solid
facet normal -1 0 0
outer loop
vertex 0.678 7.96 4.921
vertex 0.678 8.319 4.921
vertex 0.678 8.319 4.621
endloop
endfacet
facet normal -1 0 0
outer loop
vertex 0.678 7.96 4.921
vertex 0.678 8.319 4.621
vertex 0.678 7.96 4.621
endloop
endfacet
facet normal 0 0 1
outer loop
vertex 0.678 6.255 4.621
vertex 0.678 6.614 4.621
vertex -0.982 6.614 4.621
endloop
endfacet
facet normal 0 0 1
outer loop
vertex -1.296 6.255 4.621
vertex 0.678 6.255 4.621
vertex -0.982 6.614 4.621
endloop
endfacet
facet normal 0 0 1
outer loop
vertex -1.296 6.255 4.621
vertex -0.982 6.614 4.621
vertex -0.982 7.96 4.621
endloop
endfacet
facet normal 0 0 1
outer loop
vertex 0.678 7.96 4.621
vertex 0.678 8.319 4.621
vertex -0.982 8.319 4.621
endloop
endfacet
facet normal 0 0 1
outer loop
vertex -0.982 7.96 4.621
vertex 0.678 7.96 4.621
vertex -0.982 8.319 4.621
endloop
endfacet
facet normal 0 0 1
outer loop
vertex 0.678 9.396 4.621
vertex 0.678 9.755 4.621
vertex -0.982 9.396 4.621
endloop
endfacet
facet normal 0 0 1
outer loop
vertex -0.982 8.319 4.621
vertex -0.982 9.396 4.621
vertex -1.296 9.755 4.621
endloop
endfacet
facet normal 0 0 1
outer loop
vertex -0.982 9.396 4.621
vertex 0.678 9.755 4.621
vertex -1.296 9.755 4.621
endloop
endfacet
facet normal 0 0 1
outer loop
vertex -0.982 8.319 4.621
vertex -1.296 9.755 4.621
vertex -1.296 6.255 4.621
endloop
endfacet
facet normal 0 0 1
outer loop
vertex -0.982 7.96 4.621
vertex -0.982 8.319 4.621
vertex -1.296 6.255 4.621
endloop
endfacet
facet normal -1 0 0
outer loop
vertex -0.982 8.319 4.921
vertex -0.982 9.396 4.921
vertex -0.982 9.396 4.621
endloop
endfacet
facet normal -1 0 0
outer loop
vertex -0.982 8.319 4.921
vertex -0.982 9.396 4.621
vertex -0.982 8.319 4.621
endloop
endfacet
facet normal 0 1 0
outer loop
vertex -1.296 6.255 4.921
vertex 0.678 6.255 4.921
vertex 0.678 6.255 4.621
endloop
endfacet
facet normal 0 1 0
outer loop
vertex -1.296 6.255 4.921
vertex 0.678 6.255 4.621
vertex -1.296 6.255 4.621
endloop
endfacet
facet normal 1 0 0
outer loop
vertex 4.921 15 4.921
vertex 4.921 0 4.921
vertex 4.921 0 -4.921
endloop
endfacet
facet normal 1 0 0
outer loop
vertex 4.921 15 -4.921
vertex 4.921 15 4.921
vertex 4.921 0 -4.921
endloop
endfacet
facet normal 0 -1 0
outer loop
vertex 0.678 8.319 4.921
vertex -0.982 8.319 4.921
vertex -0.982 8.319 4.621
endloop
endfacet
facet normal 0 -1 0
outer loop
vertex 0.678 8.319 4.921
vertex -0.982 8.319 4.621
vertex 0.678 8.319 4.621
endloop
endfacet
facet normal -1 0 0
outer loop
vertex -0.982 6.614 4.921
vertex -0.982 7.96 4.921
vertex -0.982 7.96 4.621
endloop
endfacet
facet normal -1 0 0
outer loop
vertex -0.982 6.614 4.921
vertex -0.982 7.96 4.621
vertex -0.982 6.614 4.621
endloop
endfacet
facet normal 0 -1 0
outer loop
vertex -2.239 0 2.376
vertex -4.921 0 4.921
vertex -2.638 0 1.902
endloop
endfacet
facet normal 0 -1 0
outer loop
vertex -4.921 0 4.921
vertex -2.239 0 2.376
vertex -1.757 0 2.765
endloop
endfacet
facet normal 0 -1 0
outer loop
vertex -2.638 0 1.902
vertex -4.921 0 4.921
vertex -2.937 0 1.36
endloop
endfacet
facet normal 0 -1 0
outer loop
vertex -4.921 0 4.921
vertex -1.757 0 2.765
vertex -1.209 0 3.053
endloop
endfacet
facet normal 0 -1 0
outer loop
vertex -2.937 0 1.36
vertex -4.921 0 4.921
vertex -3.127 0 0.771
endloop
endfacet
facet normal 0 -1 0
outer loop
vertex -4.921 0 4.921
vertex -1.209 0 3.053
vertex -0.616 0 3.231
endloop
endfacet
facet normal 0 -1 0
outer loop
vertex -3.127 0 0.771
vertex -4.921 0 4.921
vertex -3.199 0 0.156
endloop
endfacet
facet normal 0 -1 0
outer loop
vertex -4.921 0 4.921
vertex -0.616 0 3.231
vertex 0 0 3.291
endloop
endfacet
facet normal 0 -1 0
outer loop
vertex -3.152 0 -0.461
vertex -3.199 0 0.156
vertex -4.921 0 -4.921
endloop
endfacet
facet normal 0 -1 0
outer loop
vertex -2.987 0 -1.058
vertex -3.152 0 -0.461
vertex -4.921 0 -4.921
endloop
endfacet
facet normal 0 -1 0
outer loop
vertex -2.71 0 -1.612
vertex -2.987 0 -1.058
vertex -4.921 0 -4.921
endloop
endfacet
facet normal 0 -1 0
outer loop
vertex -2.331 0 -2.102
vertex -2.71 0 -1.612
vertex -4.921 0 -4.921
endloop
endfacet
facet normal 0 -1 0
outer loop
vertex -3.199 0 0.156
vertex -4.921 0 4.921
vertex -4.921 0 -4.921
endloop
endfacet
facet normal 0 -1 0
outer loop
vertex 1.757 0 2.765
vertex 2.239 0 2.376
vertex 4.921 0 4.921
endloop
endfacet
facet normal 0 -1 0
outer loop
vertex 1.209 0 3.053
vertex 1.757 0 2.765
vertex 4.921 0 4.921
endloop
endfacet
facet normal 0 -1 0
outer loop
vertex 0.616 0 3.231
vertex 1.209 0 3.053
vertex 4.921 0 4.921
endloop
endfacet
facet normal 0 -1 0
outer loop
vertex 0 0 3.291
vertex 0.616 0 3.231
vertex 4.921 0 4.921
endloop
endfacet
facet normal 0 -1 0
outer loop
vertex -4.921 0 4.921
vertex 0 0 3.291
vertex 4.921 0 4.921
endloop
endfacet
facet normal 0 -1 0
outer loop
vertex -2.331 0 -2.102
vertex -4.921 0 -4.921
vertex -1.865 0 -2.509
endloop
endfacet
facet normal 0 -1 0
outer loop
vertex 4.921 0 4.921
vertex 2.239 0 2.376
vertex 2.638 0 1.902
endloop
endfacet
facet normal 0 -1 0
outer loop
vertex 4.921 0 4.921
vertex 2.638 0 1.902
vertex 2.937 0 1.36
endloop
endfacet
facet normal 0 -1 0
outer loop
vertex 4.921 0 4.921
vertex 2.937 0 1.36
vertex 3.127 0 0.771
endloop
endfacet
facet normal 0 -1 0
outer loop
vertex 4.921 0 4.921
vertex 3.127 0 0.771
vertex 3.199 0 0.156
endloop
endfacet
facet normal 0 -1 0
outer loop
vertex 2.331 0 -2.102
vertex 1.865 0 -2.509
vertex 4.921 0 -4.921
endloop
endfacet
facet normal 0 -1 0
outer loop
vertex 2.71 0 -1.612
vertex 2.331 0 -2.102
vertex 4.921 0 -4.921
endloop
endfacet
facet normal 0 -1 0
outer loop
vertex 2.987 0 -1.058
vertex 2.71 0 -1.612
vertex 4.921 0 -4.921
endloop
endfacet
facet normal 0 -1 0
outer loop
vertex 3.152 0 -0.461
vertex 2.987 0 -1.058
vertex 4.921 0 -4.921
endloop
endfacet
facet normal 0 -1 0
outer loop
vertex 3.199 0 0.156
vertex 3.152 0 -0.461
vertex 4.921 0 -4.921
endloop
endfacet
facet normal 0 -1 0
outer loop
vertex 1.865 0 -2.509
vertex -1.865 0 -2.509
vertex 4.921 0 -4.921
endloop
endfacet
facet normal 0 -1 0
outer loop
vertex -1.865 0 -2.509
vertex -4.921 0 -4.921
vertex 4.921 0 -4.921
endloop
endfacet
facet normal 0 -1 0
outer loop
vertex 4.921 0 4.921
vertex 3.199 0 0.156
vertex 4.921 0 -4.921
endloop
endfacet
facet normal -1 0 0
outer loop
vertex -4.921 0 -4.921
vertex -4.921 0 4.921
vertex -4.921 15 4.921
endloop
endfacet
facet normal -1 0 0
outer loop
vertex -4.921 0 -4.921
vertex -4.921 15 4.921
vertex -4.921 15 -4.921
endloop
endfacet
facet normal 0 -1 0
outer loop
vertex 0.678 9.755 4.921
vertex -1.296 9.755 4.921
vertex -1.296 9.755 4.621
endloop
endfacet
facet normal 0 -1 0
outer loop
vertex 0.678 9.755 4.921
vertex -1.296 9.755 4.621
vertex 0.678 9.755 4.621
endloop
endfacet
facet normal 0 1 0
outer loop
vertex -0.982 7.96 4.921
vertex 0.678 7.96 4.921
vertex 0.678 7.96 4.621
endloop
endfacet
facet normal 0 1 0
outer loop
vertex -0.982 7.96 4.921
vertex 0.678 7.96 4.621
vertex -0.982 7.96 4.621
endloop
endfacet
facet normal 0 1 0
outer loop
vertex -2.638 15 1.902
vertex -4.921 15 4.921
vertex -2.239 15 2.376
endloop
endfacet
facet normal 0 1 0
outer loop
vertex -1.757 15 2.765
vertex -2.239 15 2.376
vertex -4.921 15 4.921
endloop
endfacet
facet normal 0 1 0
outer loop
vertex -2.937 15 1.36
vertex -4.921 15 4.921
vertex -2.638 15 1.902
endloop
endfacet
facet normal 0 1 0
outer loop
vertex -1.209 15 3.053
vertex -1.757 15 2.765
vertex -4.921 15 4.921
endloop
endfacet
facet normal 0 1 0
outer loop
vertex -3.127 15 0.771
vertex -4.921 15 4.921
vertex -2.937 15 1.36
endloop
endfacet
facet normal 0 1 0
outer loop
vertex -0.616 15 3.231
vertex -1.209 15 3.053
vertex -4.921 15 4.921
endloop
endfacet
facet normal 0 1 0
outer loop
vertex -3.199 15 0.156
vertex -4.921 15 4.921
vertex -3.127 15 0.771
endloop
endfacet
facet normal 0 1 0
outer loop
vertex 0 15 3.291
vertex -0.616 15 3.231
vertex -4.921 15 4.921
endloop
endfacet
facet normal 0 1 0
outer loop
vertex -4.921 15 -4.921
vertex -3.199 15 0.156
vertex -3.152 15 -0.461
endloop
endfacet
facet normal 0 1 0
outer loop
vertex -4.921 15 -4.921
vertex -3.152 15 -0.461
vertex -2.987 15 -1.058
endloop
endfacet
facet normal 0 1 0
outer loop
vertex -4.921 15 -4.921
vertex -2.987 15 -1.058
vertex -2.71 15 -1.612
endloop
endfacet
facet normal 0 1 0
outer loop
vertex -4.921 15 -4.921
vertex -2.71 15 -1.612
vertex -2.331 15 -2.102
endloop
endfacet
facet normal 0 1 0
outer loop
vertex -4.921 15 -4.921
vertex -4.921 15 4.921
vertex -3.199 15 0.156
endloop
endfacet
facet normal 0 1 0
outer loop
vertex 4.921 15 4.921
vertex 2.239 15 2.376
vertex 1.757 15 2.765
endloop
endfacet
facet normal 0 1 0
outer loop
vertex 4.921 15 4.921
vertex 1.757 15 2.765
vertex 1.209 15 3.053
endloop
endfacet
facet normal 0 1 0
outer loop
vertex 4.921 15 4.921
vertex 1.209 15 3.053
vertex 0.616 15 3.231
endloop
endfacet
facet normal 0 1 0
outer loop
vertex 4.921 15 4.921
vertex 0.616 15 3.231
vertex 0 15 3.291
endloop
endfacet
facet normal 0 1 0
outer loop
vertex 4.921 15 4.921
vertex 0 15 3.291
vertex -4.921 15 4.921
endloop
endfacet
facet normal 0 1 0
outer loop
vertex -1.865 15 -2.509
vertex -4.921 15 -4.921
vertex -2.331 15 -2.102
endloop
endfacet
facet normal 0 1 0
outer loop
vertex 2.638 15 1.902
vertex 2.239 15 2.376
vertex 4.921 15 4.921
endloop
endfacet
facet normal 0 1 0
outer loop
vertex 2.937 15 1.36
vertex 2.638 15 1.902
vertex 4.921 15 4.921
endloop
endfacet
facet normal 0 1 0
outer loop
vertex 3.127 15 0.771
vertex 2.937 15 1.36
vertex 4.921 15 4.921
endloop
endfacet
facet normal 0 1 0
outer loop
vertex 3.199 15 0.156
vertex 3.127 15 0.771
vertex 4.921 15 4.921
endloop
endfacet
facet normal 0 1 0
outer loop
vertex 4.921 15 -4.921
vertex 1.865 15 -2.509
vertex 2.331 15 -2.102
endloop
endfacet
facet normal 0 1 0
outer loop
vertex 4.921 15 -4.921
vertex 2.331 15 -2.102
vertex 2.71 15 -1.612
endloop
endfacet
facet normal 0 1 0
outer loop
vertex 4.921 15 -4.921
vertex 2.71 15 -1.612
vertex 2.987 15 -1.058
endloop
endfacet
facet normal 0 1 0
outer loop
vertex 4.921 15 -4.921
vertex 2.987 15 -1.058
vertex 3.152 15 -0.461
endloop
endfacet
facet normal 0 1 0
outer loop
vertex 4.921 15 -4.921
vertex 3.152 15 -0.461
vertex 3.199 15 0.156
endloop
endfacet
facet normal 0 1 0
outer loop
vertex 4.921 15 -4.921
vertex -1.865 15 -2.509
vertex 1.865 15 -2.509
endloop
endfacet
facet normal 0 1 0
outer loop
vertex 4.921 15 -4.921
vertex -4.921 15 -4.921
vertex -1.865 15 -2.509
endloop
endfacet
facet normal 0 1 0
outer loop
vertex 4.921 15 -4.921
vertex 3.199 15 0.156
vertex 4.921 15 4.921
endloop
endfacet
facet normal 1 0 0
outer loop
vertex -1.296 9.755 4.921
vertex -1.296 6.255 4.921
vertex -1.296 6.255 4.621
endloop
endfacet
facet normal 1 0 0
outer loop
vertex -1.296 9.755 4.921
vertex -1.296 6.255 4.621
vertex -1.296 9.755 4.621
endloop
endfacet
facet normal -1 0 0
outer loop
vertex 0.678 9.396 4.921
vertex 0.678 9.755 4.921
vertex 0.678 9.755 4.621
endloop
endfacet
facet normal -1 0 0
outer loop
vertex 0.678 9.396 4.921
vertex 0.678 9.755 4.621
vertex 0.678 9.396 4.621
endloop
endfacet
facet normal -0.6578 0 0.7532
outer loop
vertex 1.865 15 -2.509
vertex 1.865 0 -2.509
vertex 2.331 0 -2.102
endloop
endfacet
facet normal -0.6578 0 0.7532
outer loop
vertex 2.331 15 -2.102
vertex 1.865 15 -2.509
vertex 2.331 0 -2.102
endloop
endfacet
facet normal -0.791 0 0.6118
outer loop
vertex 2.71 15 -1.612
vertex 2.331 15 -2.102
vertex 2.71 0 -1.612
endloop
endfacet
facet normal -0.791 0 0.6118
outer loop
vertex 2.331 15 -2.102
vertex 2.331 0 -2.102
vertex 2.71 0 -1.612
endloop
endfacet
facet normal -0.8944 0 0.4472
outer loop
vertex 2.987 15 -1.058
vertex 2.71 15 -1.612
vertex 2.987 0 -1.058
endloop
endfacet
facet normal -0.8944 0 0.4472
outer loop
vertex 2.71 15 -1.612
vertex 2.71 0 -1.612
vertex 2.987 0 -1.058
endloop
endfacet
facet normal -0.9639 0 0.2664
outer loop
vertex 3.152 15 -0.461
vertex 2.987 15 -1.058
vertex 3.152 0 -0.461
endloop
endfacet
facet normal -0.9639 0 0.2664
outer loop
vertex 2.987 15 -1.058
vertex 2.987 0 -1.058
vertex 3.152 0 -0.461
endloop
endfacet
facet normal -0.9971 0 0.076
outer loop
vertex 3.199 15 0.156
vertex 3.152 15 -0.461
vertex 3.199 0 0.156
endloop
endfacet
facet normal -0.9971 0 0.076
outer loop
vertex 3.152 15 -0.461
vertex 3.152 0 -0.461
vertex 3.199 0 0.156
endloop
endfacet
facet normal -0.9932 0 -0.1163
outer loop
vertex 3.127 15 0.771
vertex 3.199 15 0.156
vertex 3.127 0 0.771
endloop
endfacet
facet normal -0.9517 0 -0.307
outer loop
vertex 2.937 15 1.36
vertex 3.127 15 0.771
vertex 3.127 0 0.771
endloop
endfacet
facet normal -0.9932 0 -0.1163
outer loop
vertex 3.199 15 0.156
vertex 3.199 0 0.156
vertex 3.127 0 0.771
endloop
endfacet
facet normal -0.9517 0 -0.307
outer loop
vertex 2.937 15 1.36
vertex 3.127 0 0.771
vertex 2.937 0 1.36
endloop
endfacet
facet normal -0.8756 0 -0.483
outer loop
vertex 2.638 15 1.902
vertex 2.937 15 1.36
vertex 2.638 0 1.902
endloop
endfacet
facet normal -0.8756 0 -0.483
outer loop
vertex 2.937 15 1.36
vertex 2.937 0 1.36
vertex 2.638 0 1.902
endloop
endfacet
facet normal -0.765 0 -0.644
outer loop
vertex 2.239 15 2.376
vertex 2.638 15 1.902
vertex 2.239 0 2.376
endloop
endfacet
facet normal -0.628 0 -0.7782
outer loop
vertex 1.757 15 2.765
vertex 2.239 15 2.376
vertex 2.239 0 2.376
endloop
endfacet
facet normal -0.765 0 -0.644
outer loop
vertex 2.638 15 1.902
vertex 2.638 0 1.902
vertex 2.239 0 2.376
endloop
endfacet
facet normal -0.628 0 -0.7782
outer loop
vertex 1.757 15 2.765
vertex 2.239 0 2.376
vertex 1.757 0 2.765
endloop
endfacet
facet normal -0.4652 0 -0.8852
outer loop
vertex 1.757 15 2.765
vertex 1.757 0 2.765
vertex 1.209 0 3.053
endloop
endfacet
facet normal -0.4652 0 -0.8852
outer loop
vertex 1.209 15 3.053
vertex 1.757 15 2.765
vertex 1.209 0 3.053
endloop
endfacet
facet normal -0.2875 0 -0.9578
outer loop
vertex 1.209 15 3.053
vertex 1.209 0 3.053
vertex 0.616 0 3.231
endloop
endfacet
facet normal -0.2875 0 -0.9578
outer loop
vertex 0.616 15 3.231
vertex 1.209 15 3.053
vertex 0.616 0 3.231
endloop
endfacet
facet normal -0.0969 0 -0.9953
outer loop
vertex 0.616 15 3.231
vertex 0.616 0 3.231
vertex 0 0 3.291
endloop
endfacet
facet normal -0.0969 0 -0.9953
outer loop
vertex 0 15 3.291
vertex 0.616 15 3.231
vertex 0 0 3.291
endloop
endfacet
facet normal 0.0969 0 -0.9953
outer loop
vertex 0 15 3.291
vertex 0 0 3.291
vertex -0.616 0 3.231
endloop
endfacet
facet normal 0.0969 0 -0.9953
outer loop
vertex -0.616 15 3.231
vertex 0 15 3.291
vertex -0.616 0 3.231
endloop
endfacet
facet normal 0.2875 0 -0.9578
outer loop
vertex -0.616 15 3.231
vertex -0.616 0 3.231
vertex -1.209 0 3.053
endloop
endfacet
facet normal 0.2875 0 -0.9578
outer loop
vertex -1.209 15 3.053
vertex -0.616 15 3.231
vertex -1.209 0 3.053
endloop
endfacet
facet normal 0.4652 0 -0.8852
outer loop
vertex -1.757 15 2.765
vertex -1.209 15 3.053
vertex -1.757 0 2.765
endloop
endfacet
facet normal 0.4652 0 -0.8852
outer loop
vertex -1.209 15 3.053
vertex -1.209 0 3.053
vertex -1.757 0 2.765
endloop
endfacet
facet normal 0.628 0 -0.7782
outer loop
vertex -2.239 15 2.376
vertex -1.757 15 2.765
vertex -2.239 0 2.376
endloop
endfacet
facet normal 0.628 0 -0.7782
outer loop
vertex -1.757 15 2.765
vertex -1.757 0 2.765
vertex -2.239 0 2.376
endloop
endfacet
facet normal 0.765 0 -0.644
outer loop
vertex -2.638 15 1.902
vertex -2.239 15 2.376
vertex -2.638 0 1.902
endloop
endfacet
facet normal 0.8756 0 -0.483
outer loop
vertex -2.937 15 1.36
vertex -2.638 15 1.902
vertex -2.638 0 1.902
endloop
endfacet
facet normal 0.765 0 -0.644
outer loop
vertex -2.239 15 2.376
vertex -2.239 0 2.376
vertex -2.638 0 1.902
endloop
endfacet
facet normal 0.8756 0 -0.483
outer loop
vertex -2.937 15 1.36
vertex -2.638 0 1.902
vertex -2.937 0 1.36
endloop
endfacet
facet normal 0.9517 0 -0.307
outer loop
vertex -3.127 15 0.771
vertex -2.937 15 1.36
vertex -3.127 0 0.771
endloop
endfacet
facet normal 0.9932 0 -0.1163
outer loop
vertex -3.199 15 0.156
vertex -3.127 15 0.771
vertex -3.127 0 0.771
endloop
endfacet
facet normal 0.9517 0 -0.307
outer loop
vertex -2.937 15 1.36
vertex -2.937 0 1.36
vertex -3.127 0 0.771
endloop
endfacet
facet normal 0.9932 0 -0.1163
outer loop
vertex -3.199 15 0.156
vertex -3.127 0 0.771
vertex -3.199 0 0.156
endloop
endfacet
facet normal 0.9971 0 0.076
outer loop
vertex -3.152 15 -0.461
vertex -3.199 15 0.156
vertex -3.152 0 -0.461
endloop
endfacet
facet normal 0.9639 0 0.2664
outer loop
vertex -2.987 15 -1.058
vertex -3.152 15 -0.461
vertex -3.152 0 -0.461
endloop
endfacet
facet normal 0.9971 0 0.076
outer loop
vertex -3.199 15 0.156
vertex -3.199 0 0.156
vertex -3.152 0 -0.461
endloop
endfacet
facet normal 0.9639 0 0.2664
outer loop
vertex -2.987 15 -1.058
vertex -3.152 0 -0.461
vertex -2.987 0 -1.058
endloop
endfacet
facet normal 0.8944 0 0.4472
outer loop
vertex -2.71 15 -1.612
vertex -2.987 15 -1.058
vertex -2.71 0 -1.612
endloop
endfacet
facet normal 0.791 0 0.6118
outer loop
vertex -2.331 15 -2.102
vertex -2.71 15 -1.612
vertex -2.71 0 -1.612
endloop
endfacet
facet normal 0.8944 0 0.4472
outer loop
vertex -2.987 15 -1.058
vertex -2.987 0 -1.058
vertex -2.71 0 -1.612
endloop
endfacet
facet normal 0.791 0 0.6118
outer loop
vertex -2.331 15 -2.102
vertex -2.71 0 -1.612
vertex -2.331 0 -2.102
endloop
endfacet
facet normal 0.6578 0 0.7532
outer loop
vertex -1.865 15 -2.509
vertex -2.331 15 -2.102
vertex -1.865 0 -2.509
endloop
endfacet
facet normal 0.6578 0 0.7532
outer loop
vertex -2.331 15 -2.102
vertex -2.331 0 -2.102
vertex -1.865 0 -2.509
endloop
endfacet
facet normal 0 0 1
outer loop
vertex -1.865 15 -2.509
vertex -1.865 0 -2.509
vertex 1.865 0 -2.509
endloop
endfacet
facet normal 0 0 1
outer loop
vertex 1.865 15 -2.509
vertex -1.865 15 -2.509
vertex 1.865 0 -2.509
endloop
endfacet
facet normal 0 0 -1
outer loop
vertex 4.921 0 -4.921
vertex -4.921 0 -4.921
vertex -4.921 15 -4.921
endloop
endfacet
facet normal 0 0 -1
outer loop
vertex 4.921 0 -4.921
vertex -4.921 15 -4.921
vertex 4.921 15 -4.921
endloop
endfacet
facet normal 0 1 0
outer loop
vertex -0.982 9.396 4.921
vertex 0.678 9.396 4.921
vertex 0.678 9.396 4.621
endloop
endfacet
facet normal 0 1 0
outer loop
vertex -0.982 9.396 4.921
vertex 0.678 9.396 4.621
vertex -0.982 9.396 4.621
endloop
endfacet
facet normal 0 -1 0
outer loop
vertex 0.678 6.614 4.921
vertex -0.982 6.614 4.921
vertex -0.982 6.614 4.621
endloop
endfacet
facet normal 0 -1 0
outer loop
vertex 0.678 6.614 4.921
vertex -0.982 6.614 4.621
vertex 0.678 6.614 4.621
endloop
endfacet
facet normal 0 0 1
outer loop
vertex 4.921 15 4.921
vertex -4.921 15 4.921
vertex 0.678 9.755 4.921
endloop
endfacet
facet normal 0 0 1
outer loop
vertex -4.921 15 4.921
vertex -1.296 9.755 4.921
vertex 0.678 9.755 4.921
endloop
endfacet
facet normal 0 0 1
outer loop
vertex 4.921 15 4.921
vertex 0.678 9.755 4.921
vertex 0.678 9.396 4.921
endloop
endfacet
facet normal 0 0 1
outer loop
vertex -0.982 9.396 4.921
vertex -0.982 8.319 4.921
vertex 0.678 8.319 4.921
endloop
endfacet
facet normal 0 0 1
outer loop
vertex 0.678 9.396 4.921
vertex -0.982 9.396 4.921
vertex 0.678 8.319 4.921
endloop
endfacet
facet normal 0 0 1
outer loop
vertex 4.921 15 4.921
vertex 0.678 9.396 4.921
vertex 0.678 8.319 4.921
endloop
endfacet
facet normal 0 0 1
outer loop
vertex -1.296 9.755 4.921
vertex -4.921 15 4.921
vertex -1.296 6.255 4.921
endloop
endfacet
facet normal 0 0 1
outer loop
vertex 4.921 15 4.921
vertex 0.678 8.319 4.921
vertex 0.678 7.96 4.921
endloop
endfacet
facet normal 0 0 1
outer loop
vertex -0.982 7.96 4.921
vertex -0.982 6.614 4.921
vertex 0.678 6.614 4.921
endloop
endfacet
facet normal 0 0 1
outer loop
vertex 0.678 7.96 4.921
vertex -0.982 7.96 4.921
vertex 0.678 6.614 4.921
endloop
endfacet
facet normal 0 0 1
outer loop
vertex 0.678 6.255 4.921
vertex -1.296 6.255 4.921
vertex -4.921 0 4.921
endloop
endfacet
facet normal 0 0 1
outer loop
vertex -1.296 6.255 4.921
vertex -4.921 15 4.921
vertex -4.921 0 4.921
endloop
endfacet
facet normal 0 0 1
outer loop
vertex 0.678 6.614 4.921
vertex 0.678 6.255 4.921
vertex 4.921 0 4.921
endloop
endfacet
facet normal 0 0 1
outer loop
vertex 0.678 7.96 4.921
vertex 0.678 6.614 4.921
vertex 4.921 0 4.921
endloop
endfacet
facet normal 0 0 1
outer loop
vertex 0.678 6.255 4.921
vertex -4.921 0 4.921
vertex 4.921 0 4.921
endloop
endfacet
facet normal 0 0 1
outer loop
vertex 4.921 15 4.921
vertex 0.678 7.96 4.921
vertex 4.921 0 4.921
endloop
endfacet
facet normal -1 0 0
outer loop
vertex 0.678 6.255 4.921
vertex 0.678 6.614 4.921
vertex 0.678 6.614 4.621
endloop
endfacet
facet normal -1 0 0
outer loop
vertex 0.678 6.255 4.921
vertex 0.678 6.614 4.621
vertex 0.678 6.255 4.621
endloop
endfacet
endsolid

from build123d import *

# Parameters (mm, degrees)
SKETCH1_W           = 9.84142284
SKETCH1_H           = 9.84142284
BOSS_EXTRUDE1_DEPTH = 15
CUT_EXTRUDE1_DEPTH  = 0.3


with BuildPart() as part:
    # Sketch1 → Boss-Extrude1 (new body)
    with BuildSketch(Plane(origin=(0, 0, 0), x_dir=(1, 0, 0), z_dir=(0, 1, 0))):
        Rectangle(SKETCH1_W, SKETCH1_H)
        with BuildLine():
            Line((-1.865475811, 2.509444822), (1.865475811, 2.509444822))
            ThreePointArc((1.865475811, 2.509444822), (0, -3.290555178), (-1.865475811, 2.509444822))
        make_face(mode=Mode.SUBTRACT)
    extrude(amount=BOSS_EXTRUDE1_DEPTH)

    # Sketch2 → Cut-Extrude1 (cut)
    with BuildSketch(Plane.XY.offset(4.92071142)):
        Polygon((-1.296362428, 9.754838654), (0.677996546, 9.754838654), (0.677996546, 9.395864295), (-0.982259864, 9.395864295), (-0.982259864, 8.318941219), (0.677996546, 8.318941219), (0.677996546, 7.95996686), (-0.982259864, 7.95996686), (-0.982259864, 6.613813013), (0.677996546, 6.613813013), (0.677996546, 6.254838654), (-1.296362428, 6.254838654), align=None)
    extrude(amount=-CUT_EXTRUDE1_DEPTH, mode=Mode.SUBTRACT)


solid = part.part
